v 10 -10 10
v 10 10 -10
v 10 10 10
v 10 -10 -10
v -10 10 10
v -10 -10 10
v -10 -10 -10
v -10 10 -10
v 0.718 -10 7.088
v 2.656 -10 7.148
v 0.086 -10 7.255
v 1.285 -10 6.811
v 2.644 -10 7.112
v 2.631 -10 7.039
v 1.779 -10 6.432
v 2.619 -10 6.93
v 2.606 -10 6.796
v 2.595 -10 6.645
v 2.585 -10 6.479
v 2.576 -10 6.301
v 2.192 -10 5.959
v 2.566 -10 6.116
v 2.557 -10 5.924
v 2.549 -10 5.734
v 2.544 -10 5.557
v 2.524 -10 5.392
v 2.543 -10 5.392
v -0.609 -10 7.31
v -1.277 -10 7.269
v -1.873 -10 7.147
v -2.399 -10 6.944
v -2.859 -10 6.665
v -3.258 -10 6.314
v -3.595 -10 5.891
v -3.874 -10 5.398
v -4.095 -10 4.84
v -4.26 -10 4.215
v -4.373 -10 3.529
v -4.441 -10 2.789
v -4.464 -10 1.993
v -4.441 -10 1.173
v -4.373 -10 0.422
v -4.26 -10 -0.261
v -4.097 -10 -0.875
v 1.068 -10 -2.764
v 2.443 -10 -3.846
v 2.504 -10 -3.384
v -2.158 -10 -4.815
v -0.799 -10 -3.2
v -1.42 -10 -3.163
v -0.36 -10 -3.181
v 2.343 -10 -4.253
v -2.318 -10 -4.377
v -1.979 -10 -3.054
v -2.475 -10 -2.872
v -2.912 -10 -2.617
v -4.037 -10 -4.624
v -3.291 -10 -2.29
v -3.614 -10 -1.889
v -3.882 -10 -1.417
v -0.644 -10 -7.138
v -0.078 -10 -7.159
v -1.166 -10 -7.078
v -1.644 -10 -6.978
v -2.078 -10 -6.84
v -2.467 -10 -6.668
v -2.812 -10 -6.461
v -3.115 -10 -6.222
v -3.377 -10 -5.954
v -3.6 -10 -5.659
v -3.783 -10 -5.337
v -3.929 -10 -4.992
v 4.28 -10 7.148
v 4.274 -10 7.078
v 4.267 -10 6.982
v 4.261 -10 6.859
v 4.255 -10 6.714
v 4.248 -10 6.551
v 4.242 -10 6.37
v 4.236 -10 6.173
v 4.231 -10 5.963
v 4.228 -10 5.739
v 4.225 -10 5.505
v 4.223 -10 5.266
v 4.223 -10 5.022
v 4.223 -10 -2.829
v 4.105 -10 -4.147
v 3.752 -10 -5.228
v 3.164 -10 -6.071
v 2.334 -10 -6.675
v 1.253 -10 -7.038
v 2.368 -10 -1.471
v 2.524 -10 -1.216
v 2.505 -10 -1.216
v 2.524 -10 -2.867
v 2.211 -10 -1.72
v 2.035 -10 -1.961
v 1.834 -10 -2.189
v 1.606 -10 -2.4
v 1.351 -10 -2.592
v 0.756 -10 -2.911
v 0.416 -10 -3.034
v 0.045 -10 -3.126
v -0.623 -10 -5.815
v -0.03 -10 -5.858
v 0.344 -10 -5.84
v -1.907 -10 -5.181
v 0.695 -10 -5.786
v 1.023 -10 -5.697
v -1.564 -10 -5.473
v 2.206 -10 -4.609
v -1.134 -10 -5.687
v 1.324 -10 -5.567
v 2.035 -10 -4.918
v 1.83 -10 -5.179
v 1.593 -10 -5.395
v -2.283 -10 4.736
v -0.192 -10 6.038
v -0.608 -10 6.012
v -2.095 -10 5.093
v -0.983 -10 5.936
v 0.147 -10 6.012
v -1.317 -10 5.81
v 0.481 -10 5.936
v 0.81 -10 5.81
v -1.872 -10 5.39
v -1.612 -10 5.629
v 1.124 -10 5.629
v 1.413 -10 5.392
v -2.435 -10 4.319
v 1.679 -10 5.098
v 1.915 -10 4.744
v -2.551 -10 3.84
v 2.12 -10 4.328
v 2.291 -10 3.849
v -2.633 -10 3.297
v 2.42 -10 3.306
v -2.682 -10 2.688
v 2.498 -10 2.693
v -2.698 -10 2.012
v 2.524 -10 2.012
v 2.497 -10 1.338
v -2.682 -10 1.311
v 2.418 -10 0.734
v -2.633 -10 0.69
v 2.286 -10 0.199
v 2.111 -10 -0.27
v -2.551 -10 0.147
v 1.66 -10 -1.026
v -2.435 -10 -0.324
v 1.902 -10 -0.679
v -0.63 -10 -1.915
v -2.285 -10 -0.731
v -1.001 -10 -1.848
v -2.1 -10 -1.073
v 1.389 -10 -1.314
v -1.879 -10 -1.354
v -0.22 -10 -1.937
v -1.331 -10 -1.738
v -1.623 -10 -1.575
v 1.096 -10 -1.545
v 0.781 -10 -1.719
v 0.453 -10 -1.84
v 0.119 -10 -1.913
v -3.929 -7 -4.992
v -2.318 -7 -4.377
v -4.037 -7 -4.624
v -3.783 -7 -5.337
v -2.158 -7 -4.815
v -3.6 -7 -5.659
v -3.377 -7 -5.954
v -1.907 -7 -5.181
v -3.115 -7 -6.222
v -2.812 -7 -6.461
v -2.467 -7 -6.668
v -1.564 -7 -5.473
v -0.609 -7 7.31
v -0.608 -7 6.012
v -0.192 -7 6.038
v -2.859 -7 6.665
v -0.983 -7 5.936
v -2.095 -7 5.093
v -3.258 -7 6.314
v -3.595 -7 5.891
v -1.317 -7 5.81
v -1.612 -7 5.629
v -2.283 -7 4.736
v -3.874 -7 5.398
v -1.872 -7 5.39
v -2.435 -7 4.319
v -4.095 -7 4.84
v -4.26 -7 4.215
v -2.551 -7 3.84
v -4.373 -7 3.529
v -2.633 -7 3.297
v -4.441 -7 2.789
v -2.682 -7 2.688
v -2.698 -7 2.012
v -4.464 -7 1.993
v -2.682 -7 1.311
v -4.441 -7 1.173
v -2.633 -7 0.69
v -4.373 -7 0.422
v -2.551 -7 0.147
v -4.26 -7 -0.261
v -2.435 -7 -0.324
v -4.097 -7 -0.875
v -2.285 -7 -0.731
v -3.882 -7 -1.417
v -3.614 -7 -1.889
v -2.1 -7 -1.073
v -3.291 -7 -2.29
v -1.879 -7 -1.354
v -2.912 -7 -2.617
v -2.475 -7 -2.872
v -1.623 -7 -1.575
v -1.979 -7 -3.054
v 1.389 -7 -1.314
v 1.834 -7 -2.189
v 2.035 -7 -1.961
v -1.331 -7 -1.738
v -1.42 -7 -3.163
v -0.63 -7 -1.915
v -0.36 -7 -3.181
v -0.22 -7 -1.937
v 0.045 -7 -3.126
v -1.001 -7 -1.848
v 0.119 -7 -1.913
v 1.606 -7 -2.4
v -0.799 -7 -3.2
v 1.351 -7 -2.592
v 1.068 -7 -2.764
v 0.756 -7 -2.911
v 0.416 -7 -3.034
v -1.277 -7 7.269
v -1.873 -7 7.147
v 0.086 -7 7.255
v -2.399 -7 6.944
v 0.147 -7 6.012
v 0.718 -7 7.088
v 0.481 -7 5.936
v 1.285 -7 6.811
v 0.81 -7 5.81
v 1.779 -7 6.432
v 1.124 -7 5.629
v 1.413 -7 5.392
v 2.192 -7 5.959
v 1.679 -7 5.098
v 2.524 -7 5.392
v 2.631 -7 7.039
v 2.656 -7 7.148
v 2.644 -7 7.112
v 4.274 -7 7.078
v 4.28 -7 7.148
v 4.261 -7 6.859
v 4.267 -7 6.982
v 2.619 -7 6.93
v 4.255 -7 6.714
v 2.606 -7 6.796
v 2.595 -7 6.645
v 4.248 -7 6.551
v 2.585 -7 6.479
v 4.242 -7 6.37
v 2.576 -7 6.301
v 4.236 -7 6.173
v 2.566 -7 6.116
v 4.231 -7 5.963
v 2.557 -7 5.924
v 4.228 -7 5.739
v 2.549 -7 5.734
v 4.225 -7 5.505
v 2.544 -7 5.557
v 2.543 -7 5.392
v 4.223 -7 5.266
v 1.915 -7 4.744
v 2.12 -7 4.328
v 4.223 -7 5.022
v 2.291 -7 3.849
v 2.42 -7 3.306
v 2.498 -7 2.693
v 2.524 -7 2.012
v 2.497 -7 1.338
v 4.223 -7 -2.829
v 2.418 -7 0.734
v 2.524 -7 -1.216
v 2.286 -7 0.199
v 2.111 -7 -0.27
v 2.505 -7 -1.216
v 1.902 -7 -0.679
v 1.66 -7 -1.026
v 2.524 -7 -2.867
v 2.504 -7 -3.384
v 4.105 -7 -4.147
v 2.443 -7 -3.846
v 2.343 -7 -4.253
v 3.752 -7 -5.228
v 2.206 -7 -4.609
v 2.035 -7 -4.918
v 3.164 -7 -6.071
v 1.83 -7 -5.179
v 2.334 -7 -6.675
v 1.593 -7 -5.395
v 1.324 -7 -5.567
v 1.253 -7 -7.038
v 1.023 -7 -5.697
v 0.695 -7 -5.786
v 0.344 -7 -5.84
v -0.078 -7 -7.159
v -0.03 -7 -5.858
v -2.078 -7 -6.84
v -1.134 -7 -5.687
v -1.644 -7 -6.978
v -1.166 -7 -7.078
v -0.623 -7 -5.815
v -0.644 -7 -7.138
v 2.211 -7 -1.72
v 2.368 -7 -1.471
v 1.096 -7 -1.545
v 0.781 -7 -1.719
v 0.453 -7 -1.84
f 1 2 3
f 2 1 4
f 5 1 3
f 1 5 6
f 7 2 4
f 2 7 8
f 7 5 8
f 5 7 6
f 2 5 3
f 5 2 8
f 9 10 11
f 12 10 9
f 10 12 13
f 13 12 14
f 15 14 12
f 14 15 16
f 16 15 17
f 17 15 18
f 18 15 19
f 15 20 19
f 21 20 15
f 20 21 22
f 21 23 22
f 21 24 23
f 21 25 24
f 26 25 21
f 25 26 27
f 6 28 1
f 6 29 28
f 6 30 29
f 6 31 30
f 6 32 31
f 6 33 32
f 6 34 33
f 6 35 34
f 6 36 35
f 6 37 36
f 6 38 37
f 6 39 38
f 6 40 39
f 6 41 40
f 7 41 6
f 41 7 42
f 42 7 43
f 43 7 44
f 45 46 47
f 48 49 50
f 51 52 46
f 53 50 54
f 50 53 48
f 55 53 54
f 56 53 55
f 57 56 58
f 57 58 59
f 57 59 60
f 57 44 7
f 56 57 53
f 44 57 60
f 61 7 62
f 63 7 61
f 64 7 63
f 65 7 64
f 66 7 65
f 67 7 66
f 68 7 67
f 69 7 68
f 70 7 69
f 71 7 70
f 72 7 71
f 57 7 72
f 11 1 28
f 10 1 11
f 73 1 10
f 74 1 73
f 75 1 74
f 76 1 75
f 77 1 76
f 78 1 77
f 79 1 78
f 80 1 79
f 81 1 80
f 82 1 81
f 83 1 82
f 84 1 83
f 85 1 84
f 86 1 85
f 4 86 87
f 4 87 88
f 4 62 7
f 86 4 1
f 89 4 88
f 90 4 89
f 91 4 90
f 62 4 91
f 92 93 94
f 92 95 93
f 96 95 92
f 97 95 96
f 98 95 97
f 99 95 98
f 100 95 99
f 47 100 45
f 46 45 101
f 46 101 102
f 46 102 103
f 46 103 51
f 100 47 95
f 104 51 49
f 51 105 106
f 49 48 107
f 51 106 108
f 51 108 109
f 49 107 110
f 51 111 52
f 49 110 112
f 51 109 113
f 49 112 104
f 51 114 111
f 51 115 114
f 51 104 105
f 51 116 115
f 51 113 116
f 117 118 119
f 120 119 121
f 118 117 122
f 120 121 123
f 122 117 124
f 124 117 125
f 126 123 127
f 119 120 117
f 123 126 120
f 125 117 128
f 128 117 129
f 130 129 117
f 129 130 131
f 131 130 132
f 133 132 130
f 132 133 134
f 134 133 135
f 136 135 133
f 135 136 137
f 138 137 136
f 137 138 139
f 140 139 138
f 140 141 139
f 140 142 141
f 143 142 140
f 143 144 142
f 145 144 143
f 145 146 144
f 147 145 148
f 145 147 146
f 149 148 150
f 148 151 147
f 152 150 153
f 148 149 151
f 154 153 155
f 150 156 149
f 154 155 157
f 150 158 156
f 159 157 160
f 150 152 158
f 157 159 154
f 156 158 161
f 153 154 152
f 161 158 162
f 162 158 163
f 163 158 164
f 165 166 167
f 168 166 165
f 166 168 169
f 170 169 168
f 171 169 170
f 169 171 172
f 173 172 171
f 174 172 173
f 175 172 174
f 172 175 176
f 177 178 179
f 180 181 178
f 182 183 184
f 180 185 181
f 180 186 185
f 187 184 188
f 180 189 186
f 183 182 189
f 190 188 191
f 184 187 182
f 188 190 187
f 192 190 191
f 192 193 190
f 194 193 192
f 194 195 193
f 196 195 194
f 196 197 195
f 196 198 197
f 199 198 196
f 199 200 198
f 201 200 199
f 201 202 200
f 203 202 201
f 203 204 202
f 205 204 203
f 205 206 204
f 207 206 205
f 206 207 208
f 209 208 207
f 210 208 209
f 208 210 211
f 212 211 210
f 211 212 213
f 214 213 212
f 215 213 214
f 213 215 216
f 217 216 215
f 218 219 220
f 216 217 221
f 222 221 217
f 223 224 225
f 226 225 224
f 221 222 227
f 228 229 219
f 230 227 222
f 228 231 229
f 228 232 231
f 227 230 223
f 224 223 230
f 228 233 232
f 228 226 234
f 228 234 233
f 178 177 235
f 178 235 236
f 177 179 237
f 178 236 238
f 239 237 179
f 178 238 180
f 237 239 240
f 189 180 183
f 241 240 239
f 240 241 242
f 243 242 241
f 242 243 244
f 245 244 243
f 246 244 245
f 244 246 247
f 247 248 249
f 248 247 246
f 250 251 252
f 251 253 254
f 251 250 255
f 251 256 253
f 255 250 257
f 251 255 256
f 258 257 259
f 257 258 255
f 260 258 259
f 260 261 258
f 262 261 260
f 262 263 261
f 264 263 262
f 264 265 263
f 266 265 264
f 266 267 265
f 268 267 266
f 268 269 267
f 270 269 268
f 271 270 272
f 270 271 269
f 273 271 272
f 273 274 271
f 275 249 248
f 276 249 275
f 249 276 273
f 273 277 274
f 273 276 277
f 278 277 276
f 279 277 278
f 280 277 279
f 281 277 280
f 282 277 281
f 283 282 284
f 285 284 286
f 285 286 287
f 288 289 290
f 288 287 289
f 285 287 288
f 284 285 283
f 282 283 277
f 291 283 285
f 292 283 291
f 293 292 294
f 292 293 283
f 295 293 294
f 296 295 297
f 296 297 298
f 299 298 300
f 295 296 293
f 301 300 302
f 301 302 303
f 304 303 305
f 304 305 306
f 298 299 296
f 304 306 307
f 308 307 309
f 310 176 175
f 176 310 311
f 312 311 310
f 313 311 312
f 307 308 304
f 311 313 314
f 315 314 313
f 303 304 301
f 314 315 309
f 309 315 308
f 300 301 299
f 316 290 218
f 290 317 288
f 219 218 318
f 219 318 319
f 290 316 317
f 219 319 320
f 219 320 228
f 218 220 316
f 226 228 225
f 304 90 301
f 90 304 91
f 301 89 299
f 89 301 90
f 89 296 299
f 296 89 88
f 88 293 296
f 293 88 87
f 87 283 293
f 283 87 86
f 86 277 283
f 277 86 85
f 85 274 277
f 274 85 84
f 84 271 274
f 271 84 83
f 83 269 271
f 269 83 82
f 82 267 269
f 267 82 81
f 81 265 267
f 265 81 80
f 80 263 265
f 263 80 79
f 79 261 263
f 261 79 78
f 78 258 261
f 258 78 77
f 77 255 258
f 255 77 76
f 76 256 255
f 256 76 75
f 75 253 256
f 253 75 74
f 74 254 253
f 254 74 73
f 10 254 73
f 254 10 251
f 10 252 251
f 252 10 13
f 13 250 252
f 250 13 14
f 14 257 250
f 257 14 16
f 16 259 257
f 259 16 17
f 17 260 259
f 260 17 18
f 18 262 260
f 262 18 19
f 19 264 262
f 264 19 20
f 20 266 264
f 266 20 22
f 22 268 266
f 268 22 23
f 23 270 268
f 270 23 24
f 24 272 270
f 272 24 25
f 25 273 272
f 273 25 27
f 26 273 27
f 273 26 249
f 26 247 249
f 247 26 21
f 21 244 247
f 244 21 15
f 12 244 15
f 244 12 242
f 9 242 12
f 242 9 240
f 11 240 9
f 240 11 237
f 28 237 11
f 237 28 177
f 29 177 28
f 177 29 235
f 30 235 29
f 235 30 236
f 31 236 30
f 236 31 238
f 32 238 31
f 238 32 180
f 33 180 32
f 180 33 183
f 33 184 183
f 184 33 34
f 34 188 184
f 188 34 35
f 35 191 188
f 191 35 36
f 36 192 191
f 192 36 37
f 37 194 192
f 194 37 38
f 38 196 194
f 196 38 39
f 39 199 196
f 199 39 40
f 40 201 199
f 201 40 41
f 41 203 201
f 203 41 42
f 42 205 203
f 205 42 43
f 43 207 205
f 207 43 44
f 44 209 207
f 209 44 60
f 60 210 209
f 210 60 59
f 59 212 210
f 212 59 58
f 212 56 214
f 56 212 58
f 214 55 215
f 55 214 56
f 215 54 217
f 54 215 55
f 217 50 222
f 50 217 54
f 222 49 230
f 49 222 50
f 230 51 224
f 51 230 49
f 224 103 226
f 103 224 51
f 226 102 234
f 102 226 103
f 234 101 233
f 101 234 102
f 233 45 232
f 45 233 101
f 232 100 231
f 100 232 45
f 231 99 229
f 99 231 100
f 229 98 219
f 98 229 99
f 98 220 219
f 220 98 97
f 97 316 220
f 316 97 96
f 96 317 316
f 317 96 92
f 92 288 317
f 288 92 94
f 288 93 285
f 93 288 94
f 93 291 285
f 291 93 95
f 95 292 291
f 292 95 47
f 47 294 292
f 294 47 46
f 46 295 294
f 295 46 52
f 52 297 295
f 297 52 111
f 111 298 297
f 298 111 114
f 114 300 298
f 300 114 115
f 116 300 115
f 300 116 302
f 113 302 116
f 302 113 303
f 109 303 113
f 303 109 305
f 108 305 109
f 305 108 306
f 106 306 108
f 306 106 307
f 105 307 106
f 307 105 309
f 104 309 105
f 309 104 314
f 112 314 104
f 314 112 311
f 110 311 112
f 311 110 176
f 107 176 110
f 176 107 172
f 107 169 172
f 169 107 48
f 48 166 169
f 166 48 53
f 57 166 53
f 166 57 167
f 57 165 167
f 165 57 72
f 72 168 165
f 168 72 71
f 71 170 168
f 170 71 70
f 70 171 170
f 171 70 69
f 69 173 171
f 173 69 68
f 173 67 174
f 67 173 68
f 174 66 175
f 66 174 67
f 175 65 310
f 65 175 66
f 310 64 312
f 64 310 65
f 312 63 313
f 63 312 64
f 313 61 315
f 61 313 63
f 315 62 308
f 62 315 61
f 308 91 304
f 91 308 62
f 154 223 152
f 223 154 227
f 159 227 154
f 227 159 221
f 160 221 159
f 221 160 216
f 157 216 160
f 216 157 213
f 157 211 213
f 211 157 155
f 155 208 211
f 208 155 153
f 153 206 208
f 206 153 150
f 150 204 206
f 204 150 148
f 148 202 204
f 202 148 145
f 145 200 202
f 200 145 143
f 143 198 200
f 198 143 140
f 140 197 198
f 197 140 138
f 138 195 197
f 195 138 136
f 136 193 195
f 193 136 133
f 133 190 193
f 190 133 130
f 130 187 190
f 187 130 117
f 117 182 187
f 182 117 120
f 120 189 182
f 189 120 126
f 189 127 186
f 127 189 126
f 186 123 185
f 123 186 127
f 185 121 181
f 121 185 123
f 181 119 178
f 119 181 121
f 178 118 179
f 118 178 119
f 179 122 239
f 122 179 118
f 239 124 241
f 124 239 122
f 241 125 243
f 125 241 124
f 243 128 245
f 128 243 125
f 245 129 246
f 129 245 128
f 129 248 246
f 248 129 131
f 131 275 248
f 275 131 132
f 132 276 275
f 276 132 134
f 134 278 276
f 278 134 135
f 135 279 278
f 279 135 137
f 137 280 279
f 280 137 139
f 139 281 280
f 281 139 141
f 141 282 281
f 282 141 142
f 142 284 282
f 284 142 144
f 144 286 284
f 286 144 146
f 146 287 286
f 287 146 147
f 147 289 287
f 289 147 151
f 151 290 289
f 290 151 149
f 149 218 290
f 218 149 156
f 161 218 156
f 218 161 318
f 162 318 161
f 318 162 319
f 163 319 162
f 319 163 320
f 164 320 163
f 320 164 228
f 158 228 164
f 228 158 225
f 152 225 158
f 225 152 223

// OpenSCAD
font_size = 14;
letter_depth = 3;


module letter(l) {
    linear_extrude(height = letter_depth*2, center=true) {
        text(l, size = font_size, halign = "center",
            valign = "center", $fn = 16);
    }
}


difference(){
    cube(20, center=true);
    translate([0,-10,0]) rotate([90,0,0]) letter("g");
}
